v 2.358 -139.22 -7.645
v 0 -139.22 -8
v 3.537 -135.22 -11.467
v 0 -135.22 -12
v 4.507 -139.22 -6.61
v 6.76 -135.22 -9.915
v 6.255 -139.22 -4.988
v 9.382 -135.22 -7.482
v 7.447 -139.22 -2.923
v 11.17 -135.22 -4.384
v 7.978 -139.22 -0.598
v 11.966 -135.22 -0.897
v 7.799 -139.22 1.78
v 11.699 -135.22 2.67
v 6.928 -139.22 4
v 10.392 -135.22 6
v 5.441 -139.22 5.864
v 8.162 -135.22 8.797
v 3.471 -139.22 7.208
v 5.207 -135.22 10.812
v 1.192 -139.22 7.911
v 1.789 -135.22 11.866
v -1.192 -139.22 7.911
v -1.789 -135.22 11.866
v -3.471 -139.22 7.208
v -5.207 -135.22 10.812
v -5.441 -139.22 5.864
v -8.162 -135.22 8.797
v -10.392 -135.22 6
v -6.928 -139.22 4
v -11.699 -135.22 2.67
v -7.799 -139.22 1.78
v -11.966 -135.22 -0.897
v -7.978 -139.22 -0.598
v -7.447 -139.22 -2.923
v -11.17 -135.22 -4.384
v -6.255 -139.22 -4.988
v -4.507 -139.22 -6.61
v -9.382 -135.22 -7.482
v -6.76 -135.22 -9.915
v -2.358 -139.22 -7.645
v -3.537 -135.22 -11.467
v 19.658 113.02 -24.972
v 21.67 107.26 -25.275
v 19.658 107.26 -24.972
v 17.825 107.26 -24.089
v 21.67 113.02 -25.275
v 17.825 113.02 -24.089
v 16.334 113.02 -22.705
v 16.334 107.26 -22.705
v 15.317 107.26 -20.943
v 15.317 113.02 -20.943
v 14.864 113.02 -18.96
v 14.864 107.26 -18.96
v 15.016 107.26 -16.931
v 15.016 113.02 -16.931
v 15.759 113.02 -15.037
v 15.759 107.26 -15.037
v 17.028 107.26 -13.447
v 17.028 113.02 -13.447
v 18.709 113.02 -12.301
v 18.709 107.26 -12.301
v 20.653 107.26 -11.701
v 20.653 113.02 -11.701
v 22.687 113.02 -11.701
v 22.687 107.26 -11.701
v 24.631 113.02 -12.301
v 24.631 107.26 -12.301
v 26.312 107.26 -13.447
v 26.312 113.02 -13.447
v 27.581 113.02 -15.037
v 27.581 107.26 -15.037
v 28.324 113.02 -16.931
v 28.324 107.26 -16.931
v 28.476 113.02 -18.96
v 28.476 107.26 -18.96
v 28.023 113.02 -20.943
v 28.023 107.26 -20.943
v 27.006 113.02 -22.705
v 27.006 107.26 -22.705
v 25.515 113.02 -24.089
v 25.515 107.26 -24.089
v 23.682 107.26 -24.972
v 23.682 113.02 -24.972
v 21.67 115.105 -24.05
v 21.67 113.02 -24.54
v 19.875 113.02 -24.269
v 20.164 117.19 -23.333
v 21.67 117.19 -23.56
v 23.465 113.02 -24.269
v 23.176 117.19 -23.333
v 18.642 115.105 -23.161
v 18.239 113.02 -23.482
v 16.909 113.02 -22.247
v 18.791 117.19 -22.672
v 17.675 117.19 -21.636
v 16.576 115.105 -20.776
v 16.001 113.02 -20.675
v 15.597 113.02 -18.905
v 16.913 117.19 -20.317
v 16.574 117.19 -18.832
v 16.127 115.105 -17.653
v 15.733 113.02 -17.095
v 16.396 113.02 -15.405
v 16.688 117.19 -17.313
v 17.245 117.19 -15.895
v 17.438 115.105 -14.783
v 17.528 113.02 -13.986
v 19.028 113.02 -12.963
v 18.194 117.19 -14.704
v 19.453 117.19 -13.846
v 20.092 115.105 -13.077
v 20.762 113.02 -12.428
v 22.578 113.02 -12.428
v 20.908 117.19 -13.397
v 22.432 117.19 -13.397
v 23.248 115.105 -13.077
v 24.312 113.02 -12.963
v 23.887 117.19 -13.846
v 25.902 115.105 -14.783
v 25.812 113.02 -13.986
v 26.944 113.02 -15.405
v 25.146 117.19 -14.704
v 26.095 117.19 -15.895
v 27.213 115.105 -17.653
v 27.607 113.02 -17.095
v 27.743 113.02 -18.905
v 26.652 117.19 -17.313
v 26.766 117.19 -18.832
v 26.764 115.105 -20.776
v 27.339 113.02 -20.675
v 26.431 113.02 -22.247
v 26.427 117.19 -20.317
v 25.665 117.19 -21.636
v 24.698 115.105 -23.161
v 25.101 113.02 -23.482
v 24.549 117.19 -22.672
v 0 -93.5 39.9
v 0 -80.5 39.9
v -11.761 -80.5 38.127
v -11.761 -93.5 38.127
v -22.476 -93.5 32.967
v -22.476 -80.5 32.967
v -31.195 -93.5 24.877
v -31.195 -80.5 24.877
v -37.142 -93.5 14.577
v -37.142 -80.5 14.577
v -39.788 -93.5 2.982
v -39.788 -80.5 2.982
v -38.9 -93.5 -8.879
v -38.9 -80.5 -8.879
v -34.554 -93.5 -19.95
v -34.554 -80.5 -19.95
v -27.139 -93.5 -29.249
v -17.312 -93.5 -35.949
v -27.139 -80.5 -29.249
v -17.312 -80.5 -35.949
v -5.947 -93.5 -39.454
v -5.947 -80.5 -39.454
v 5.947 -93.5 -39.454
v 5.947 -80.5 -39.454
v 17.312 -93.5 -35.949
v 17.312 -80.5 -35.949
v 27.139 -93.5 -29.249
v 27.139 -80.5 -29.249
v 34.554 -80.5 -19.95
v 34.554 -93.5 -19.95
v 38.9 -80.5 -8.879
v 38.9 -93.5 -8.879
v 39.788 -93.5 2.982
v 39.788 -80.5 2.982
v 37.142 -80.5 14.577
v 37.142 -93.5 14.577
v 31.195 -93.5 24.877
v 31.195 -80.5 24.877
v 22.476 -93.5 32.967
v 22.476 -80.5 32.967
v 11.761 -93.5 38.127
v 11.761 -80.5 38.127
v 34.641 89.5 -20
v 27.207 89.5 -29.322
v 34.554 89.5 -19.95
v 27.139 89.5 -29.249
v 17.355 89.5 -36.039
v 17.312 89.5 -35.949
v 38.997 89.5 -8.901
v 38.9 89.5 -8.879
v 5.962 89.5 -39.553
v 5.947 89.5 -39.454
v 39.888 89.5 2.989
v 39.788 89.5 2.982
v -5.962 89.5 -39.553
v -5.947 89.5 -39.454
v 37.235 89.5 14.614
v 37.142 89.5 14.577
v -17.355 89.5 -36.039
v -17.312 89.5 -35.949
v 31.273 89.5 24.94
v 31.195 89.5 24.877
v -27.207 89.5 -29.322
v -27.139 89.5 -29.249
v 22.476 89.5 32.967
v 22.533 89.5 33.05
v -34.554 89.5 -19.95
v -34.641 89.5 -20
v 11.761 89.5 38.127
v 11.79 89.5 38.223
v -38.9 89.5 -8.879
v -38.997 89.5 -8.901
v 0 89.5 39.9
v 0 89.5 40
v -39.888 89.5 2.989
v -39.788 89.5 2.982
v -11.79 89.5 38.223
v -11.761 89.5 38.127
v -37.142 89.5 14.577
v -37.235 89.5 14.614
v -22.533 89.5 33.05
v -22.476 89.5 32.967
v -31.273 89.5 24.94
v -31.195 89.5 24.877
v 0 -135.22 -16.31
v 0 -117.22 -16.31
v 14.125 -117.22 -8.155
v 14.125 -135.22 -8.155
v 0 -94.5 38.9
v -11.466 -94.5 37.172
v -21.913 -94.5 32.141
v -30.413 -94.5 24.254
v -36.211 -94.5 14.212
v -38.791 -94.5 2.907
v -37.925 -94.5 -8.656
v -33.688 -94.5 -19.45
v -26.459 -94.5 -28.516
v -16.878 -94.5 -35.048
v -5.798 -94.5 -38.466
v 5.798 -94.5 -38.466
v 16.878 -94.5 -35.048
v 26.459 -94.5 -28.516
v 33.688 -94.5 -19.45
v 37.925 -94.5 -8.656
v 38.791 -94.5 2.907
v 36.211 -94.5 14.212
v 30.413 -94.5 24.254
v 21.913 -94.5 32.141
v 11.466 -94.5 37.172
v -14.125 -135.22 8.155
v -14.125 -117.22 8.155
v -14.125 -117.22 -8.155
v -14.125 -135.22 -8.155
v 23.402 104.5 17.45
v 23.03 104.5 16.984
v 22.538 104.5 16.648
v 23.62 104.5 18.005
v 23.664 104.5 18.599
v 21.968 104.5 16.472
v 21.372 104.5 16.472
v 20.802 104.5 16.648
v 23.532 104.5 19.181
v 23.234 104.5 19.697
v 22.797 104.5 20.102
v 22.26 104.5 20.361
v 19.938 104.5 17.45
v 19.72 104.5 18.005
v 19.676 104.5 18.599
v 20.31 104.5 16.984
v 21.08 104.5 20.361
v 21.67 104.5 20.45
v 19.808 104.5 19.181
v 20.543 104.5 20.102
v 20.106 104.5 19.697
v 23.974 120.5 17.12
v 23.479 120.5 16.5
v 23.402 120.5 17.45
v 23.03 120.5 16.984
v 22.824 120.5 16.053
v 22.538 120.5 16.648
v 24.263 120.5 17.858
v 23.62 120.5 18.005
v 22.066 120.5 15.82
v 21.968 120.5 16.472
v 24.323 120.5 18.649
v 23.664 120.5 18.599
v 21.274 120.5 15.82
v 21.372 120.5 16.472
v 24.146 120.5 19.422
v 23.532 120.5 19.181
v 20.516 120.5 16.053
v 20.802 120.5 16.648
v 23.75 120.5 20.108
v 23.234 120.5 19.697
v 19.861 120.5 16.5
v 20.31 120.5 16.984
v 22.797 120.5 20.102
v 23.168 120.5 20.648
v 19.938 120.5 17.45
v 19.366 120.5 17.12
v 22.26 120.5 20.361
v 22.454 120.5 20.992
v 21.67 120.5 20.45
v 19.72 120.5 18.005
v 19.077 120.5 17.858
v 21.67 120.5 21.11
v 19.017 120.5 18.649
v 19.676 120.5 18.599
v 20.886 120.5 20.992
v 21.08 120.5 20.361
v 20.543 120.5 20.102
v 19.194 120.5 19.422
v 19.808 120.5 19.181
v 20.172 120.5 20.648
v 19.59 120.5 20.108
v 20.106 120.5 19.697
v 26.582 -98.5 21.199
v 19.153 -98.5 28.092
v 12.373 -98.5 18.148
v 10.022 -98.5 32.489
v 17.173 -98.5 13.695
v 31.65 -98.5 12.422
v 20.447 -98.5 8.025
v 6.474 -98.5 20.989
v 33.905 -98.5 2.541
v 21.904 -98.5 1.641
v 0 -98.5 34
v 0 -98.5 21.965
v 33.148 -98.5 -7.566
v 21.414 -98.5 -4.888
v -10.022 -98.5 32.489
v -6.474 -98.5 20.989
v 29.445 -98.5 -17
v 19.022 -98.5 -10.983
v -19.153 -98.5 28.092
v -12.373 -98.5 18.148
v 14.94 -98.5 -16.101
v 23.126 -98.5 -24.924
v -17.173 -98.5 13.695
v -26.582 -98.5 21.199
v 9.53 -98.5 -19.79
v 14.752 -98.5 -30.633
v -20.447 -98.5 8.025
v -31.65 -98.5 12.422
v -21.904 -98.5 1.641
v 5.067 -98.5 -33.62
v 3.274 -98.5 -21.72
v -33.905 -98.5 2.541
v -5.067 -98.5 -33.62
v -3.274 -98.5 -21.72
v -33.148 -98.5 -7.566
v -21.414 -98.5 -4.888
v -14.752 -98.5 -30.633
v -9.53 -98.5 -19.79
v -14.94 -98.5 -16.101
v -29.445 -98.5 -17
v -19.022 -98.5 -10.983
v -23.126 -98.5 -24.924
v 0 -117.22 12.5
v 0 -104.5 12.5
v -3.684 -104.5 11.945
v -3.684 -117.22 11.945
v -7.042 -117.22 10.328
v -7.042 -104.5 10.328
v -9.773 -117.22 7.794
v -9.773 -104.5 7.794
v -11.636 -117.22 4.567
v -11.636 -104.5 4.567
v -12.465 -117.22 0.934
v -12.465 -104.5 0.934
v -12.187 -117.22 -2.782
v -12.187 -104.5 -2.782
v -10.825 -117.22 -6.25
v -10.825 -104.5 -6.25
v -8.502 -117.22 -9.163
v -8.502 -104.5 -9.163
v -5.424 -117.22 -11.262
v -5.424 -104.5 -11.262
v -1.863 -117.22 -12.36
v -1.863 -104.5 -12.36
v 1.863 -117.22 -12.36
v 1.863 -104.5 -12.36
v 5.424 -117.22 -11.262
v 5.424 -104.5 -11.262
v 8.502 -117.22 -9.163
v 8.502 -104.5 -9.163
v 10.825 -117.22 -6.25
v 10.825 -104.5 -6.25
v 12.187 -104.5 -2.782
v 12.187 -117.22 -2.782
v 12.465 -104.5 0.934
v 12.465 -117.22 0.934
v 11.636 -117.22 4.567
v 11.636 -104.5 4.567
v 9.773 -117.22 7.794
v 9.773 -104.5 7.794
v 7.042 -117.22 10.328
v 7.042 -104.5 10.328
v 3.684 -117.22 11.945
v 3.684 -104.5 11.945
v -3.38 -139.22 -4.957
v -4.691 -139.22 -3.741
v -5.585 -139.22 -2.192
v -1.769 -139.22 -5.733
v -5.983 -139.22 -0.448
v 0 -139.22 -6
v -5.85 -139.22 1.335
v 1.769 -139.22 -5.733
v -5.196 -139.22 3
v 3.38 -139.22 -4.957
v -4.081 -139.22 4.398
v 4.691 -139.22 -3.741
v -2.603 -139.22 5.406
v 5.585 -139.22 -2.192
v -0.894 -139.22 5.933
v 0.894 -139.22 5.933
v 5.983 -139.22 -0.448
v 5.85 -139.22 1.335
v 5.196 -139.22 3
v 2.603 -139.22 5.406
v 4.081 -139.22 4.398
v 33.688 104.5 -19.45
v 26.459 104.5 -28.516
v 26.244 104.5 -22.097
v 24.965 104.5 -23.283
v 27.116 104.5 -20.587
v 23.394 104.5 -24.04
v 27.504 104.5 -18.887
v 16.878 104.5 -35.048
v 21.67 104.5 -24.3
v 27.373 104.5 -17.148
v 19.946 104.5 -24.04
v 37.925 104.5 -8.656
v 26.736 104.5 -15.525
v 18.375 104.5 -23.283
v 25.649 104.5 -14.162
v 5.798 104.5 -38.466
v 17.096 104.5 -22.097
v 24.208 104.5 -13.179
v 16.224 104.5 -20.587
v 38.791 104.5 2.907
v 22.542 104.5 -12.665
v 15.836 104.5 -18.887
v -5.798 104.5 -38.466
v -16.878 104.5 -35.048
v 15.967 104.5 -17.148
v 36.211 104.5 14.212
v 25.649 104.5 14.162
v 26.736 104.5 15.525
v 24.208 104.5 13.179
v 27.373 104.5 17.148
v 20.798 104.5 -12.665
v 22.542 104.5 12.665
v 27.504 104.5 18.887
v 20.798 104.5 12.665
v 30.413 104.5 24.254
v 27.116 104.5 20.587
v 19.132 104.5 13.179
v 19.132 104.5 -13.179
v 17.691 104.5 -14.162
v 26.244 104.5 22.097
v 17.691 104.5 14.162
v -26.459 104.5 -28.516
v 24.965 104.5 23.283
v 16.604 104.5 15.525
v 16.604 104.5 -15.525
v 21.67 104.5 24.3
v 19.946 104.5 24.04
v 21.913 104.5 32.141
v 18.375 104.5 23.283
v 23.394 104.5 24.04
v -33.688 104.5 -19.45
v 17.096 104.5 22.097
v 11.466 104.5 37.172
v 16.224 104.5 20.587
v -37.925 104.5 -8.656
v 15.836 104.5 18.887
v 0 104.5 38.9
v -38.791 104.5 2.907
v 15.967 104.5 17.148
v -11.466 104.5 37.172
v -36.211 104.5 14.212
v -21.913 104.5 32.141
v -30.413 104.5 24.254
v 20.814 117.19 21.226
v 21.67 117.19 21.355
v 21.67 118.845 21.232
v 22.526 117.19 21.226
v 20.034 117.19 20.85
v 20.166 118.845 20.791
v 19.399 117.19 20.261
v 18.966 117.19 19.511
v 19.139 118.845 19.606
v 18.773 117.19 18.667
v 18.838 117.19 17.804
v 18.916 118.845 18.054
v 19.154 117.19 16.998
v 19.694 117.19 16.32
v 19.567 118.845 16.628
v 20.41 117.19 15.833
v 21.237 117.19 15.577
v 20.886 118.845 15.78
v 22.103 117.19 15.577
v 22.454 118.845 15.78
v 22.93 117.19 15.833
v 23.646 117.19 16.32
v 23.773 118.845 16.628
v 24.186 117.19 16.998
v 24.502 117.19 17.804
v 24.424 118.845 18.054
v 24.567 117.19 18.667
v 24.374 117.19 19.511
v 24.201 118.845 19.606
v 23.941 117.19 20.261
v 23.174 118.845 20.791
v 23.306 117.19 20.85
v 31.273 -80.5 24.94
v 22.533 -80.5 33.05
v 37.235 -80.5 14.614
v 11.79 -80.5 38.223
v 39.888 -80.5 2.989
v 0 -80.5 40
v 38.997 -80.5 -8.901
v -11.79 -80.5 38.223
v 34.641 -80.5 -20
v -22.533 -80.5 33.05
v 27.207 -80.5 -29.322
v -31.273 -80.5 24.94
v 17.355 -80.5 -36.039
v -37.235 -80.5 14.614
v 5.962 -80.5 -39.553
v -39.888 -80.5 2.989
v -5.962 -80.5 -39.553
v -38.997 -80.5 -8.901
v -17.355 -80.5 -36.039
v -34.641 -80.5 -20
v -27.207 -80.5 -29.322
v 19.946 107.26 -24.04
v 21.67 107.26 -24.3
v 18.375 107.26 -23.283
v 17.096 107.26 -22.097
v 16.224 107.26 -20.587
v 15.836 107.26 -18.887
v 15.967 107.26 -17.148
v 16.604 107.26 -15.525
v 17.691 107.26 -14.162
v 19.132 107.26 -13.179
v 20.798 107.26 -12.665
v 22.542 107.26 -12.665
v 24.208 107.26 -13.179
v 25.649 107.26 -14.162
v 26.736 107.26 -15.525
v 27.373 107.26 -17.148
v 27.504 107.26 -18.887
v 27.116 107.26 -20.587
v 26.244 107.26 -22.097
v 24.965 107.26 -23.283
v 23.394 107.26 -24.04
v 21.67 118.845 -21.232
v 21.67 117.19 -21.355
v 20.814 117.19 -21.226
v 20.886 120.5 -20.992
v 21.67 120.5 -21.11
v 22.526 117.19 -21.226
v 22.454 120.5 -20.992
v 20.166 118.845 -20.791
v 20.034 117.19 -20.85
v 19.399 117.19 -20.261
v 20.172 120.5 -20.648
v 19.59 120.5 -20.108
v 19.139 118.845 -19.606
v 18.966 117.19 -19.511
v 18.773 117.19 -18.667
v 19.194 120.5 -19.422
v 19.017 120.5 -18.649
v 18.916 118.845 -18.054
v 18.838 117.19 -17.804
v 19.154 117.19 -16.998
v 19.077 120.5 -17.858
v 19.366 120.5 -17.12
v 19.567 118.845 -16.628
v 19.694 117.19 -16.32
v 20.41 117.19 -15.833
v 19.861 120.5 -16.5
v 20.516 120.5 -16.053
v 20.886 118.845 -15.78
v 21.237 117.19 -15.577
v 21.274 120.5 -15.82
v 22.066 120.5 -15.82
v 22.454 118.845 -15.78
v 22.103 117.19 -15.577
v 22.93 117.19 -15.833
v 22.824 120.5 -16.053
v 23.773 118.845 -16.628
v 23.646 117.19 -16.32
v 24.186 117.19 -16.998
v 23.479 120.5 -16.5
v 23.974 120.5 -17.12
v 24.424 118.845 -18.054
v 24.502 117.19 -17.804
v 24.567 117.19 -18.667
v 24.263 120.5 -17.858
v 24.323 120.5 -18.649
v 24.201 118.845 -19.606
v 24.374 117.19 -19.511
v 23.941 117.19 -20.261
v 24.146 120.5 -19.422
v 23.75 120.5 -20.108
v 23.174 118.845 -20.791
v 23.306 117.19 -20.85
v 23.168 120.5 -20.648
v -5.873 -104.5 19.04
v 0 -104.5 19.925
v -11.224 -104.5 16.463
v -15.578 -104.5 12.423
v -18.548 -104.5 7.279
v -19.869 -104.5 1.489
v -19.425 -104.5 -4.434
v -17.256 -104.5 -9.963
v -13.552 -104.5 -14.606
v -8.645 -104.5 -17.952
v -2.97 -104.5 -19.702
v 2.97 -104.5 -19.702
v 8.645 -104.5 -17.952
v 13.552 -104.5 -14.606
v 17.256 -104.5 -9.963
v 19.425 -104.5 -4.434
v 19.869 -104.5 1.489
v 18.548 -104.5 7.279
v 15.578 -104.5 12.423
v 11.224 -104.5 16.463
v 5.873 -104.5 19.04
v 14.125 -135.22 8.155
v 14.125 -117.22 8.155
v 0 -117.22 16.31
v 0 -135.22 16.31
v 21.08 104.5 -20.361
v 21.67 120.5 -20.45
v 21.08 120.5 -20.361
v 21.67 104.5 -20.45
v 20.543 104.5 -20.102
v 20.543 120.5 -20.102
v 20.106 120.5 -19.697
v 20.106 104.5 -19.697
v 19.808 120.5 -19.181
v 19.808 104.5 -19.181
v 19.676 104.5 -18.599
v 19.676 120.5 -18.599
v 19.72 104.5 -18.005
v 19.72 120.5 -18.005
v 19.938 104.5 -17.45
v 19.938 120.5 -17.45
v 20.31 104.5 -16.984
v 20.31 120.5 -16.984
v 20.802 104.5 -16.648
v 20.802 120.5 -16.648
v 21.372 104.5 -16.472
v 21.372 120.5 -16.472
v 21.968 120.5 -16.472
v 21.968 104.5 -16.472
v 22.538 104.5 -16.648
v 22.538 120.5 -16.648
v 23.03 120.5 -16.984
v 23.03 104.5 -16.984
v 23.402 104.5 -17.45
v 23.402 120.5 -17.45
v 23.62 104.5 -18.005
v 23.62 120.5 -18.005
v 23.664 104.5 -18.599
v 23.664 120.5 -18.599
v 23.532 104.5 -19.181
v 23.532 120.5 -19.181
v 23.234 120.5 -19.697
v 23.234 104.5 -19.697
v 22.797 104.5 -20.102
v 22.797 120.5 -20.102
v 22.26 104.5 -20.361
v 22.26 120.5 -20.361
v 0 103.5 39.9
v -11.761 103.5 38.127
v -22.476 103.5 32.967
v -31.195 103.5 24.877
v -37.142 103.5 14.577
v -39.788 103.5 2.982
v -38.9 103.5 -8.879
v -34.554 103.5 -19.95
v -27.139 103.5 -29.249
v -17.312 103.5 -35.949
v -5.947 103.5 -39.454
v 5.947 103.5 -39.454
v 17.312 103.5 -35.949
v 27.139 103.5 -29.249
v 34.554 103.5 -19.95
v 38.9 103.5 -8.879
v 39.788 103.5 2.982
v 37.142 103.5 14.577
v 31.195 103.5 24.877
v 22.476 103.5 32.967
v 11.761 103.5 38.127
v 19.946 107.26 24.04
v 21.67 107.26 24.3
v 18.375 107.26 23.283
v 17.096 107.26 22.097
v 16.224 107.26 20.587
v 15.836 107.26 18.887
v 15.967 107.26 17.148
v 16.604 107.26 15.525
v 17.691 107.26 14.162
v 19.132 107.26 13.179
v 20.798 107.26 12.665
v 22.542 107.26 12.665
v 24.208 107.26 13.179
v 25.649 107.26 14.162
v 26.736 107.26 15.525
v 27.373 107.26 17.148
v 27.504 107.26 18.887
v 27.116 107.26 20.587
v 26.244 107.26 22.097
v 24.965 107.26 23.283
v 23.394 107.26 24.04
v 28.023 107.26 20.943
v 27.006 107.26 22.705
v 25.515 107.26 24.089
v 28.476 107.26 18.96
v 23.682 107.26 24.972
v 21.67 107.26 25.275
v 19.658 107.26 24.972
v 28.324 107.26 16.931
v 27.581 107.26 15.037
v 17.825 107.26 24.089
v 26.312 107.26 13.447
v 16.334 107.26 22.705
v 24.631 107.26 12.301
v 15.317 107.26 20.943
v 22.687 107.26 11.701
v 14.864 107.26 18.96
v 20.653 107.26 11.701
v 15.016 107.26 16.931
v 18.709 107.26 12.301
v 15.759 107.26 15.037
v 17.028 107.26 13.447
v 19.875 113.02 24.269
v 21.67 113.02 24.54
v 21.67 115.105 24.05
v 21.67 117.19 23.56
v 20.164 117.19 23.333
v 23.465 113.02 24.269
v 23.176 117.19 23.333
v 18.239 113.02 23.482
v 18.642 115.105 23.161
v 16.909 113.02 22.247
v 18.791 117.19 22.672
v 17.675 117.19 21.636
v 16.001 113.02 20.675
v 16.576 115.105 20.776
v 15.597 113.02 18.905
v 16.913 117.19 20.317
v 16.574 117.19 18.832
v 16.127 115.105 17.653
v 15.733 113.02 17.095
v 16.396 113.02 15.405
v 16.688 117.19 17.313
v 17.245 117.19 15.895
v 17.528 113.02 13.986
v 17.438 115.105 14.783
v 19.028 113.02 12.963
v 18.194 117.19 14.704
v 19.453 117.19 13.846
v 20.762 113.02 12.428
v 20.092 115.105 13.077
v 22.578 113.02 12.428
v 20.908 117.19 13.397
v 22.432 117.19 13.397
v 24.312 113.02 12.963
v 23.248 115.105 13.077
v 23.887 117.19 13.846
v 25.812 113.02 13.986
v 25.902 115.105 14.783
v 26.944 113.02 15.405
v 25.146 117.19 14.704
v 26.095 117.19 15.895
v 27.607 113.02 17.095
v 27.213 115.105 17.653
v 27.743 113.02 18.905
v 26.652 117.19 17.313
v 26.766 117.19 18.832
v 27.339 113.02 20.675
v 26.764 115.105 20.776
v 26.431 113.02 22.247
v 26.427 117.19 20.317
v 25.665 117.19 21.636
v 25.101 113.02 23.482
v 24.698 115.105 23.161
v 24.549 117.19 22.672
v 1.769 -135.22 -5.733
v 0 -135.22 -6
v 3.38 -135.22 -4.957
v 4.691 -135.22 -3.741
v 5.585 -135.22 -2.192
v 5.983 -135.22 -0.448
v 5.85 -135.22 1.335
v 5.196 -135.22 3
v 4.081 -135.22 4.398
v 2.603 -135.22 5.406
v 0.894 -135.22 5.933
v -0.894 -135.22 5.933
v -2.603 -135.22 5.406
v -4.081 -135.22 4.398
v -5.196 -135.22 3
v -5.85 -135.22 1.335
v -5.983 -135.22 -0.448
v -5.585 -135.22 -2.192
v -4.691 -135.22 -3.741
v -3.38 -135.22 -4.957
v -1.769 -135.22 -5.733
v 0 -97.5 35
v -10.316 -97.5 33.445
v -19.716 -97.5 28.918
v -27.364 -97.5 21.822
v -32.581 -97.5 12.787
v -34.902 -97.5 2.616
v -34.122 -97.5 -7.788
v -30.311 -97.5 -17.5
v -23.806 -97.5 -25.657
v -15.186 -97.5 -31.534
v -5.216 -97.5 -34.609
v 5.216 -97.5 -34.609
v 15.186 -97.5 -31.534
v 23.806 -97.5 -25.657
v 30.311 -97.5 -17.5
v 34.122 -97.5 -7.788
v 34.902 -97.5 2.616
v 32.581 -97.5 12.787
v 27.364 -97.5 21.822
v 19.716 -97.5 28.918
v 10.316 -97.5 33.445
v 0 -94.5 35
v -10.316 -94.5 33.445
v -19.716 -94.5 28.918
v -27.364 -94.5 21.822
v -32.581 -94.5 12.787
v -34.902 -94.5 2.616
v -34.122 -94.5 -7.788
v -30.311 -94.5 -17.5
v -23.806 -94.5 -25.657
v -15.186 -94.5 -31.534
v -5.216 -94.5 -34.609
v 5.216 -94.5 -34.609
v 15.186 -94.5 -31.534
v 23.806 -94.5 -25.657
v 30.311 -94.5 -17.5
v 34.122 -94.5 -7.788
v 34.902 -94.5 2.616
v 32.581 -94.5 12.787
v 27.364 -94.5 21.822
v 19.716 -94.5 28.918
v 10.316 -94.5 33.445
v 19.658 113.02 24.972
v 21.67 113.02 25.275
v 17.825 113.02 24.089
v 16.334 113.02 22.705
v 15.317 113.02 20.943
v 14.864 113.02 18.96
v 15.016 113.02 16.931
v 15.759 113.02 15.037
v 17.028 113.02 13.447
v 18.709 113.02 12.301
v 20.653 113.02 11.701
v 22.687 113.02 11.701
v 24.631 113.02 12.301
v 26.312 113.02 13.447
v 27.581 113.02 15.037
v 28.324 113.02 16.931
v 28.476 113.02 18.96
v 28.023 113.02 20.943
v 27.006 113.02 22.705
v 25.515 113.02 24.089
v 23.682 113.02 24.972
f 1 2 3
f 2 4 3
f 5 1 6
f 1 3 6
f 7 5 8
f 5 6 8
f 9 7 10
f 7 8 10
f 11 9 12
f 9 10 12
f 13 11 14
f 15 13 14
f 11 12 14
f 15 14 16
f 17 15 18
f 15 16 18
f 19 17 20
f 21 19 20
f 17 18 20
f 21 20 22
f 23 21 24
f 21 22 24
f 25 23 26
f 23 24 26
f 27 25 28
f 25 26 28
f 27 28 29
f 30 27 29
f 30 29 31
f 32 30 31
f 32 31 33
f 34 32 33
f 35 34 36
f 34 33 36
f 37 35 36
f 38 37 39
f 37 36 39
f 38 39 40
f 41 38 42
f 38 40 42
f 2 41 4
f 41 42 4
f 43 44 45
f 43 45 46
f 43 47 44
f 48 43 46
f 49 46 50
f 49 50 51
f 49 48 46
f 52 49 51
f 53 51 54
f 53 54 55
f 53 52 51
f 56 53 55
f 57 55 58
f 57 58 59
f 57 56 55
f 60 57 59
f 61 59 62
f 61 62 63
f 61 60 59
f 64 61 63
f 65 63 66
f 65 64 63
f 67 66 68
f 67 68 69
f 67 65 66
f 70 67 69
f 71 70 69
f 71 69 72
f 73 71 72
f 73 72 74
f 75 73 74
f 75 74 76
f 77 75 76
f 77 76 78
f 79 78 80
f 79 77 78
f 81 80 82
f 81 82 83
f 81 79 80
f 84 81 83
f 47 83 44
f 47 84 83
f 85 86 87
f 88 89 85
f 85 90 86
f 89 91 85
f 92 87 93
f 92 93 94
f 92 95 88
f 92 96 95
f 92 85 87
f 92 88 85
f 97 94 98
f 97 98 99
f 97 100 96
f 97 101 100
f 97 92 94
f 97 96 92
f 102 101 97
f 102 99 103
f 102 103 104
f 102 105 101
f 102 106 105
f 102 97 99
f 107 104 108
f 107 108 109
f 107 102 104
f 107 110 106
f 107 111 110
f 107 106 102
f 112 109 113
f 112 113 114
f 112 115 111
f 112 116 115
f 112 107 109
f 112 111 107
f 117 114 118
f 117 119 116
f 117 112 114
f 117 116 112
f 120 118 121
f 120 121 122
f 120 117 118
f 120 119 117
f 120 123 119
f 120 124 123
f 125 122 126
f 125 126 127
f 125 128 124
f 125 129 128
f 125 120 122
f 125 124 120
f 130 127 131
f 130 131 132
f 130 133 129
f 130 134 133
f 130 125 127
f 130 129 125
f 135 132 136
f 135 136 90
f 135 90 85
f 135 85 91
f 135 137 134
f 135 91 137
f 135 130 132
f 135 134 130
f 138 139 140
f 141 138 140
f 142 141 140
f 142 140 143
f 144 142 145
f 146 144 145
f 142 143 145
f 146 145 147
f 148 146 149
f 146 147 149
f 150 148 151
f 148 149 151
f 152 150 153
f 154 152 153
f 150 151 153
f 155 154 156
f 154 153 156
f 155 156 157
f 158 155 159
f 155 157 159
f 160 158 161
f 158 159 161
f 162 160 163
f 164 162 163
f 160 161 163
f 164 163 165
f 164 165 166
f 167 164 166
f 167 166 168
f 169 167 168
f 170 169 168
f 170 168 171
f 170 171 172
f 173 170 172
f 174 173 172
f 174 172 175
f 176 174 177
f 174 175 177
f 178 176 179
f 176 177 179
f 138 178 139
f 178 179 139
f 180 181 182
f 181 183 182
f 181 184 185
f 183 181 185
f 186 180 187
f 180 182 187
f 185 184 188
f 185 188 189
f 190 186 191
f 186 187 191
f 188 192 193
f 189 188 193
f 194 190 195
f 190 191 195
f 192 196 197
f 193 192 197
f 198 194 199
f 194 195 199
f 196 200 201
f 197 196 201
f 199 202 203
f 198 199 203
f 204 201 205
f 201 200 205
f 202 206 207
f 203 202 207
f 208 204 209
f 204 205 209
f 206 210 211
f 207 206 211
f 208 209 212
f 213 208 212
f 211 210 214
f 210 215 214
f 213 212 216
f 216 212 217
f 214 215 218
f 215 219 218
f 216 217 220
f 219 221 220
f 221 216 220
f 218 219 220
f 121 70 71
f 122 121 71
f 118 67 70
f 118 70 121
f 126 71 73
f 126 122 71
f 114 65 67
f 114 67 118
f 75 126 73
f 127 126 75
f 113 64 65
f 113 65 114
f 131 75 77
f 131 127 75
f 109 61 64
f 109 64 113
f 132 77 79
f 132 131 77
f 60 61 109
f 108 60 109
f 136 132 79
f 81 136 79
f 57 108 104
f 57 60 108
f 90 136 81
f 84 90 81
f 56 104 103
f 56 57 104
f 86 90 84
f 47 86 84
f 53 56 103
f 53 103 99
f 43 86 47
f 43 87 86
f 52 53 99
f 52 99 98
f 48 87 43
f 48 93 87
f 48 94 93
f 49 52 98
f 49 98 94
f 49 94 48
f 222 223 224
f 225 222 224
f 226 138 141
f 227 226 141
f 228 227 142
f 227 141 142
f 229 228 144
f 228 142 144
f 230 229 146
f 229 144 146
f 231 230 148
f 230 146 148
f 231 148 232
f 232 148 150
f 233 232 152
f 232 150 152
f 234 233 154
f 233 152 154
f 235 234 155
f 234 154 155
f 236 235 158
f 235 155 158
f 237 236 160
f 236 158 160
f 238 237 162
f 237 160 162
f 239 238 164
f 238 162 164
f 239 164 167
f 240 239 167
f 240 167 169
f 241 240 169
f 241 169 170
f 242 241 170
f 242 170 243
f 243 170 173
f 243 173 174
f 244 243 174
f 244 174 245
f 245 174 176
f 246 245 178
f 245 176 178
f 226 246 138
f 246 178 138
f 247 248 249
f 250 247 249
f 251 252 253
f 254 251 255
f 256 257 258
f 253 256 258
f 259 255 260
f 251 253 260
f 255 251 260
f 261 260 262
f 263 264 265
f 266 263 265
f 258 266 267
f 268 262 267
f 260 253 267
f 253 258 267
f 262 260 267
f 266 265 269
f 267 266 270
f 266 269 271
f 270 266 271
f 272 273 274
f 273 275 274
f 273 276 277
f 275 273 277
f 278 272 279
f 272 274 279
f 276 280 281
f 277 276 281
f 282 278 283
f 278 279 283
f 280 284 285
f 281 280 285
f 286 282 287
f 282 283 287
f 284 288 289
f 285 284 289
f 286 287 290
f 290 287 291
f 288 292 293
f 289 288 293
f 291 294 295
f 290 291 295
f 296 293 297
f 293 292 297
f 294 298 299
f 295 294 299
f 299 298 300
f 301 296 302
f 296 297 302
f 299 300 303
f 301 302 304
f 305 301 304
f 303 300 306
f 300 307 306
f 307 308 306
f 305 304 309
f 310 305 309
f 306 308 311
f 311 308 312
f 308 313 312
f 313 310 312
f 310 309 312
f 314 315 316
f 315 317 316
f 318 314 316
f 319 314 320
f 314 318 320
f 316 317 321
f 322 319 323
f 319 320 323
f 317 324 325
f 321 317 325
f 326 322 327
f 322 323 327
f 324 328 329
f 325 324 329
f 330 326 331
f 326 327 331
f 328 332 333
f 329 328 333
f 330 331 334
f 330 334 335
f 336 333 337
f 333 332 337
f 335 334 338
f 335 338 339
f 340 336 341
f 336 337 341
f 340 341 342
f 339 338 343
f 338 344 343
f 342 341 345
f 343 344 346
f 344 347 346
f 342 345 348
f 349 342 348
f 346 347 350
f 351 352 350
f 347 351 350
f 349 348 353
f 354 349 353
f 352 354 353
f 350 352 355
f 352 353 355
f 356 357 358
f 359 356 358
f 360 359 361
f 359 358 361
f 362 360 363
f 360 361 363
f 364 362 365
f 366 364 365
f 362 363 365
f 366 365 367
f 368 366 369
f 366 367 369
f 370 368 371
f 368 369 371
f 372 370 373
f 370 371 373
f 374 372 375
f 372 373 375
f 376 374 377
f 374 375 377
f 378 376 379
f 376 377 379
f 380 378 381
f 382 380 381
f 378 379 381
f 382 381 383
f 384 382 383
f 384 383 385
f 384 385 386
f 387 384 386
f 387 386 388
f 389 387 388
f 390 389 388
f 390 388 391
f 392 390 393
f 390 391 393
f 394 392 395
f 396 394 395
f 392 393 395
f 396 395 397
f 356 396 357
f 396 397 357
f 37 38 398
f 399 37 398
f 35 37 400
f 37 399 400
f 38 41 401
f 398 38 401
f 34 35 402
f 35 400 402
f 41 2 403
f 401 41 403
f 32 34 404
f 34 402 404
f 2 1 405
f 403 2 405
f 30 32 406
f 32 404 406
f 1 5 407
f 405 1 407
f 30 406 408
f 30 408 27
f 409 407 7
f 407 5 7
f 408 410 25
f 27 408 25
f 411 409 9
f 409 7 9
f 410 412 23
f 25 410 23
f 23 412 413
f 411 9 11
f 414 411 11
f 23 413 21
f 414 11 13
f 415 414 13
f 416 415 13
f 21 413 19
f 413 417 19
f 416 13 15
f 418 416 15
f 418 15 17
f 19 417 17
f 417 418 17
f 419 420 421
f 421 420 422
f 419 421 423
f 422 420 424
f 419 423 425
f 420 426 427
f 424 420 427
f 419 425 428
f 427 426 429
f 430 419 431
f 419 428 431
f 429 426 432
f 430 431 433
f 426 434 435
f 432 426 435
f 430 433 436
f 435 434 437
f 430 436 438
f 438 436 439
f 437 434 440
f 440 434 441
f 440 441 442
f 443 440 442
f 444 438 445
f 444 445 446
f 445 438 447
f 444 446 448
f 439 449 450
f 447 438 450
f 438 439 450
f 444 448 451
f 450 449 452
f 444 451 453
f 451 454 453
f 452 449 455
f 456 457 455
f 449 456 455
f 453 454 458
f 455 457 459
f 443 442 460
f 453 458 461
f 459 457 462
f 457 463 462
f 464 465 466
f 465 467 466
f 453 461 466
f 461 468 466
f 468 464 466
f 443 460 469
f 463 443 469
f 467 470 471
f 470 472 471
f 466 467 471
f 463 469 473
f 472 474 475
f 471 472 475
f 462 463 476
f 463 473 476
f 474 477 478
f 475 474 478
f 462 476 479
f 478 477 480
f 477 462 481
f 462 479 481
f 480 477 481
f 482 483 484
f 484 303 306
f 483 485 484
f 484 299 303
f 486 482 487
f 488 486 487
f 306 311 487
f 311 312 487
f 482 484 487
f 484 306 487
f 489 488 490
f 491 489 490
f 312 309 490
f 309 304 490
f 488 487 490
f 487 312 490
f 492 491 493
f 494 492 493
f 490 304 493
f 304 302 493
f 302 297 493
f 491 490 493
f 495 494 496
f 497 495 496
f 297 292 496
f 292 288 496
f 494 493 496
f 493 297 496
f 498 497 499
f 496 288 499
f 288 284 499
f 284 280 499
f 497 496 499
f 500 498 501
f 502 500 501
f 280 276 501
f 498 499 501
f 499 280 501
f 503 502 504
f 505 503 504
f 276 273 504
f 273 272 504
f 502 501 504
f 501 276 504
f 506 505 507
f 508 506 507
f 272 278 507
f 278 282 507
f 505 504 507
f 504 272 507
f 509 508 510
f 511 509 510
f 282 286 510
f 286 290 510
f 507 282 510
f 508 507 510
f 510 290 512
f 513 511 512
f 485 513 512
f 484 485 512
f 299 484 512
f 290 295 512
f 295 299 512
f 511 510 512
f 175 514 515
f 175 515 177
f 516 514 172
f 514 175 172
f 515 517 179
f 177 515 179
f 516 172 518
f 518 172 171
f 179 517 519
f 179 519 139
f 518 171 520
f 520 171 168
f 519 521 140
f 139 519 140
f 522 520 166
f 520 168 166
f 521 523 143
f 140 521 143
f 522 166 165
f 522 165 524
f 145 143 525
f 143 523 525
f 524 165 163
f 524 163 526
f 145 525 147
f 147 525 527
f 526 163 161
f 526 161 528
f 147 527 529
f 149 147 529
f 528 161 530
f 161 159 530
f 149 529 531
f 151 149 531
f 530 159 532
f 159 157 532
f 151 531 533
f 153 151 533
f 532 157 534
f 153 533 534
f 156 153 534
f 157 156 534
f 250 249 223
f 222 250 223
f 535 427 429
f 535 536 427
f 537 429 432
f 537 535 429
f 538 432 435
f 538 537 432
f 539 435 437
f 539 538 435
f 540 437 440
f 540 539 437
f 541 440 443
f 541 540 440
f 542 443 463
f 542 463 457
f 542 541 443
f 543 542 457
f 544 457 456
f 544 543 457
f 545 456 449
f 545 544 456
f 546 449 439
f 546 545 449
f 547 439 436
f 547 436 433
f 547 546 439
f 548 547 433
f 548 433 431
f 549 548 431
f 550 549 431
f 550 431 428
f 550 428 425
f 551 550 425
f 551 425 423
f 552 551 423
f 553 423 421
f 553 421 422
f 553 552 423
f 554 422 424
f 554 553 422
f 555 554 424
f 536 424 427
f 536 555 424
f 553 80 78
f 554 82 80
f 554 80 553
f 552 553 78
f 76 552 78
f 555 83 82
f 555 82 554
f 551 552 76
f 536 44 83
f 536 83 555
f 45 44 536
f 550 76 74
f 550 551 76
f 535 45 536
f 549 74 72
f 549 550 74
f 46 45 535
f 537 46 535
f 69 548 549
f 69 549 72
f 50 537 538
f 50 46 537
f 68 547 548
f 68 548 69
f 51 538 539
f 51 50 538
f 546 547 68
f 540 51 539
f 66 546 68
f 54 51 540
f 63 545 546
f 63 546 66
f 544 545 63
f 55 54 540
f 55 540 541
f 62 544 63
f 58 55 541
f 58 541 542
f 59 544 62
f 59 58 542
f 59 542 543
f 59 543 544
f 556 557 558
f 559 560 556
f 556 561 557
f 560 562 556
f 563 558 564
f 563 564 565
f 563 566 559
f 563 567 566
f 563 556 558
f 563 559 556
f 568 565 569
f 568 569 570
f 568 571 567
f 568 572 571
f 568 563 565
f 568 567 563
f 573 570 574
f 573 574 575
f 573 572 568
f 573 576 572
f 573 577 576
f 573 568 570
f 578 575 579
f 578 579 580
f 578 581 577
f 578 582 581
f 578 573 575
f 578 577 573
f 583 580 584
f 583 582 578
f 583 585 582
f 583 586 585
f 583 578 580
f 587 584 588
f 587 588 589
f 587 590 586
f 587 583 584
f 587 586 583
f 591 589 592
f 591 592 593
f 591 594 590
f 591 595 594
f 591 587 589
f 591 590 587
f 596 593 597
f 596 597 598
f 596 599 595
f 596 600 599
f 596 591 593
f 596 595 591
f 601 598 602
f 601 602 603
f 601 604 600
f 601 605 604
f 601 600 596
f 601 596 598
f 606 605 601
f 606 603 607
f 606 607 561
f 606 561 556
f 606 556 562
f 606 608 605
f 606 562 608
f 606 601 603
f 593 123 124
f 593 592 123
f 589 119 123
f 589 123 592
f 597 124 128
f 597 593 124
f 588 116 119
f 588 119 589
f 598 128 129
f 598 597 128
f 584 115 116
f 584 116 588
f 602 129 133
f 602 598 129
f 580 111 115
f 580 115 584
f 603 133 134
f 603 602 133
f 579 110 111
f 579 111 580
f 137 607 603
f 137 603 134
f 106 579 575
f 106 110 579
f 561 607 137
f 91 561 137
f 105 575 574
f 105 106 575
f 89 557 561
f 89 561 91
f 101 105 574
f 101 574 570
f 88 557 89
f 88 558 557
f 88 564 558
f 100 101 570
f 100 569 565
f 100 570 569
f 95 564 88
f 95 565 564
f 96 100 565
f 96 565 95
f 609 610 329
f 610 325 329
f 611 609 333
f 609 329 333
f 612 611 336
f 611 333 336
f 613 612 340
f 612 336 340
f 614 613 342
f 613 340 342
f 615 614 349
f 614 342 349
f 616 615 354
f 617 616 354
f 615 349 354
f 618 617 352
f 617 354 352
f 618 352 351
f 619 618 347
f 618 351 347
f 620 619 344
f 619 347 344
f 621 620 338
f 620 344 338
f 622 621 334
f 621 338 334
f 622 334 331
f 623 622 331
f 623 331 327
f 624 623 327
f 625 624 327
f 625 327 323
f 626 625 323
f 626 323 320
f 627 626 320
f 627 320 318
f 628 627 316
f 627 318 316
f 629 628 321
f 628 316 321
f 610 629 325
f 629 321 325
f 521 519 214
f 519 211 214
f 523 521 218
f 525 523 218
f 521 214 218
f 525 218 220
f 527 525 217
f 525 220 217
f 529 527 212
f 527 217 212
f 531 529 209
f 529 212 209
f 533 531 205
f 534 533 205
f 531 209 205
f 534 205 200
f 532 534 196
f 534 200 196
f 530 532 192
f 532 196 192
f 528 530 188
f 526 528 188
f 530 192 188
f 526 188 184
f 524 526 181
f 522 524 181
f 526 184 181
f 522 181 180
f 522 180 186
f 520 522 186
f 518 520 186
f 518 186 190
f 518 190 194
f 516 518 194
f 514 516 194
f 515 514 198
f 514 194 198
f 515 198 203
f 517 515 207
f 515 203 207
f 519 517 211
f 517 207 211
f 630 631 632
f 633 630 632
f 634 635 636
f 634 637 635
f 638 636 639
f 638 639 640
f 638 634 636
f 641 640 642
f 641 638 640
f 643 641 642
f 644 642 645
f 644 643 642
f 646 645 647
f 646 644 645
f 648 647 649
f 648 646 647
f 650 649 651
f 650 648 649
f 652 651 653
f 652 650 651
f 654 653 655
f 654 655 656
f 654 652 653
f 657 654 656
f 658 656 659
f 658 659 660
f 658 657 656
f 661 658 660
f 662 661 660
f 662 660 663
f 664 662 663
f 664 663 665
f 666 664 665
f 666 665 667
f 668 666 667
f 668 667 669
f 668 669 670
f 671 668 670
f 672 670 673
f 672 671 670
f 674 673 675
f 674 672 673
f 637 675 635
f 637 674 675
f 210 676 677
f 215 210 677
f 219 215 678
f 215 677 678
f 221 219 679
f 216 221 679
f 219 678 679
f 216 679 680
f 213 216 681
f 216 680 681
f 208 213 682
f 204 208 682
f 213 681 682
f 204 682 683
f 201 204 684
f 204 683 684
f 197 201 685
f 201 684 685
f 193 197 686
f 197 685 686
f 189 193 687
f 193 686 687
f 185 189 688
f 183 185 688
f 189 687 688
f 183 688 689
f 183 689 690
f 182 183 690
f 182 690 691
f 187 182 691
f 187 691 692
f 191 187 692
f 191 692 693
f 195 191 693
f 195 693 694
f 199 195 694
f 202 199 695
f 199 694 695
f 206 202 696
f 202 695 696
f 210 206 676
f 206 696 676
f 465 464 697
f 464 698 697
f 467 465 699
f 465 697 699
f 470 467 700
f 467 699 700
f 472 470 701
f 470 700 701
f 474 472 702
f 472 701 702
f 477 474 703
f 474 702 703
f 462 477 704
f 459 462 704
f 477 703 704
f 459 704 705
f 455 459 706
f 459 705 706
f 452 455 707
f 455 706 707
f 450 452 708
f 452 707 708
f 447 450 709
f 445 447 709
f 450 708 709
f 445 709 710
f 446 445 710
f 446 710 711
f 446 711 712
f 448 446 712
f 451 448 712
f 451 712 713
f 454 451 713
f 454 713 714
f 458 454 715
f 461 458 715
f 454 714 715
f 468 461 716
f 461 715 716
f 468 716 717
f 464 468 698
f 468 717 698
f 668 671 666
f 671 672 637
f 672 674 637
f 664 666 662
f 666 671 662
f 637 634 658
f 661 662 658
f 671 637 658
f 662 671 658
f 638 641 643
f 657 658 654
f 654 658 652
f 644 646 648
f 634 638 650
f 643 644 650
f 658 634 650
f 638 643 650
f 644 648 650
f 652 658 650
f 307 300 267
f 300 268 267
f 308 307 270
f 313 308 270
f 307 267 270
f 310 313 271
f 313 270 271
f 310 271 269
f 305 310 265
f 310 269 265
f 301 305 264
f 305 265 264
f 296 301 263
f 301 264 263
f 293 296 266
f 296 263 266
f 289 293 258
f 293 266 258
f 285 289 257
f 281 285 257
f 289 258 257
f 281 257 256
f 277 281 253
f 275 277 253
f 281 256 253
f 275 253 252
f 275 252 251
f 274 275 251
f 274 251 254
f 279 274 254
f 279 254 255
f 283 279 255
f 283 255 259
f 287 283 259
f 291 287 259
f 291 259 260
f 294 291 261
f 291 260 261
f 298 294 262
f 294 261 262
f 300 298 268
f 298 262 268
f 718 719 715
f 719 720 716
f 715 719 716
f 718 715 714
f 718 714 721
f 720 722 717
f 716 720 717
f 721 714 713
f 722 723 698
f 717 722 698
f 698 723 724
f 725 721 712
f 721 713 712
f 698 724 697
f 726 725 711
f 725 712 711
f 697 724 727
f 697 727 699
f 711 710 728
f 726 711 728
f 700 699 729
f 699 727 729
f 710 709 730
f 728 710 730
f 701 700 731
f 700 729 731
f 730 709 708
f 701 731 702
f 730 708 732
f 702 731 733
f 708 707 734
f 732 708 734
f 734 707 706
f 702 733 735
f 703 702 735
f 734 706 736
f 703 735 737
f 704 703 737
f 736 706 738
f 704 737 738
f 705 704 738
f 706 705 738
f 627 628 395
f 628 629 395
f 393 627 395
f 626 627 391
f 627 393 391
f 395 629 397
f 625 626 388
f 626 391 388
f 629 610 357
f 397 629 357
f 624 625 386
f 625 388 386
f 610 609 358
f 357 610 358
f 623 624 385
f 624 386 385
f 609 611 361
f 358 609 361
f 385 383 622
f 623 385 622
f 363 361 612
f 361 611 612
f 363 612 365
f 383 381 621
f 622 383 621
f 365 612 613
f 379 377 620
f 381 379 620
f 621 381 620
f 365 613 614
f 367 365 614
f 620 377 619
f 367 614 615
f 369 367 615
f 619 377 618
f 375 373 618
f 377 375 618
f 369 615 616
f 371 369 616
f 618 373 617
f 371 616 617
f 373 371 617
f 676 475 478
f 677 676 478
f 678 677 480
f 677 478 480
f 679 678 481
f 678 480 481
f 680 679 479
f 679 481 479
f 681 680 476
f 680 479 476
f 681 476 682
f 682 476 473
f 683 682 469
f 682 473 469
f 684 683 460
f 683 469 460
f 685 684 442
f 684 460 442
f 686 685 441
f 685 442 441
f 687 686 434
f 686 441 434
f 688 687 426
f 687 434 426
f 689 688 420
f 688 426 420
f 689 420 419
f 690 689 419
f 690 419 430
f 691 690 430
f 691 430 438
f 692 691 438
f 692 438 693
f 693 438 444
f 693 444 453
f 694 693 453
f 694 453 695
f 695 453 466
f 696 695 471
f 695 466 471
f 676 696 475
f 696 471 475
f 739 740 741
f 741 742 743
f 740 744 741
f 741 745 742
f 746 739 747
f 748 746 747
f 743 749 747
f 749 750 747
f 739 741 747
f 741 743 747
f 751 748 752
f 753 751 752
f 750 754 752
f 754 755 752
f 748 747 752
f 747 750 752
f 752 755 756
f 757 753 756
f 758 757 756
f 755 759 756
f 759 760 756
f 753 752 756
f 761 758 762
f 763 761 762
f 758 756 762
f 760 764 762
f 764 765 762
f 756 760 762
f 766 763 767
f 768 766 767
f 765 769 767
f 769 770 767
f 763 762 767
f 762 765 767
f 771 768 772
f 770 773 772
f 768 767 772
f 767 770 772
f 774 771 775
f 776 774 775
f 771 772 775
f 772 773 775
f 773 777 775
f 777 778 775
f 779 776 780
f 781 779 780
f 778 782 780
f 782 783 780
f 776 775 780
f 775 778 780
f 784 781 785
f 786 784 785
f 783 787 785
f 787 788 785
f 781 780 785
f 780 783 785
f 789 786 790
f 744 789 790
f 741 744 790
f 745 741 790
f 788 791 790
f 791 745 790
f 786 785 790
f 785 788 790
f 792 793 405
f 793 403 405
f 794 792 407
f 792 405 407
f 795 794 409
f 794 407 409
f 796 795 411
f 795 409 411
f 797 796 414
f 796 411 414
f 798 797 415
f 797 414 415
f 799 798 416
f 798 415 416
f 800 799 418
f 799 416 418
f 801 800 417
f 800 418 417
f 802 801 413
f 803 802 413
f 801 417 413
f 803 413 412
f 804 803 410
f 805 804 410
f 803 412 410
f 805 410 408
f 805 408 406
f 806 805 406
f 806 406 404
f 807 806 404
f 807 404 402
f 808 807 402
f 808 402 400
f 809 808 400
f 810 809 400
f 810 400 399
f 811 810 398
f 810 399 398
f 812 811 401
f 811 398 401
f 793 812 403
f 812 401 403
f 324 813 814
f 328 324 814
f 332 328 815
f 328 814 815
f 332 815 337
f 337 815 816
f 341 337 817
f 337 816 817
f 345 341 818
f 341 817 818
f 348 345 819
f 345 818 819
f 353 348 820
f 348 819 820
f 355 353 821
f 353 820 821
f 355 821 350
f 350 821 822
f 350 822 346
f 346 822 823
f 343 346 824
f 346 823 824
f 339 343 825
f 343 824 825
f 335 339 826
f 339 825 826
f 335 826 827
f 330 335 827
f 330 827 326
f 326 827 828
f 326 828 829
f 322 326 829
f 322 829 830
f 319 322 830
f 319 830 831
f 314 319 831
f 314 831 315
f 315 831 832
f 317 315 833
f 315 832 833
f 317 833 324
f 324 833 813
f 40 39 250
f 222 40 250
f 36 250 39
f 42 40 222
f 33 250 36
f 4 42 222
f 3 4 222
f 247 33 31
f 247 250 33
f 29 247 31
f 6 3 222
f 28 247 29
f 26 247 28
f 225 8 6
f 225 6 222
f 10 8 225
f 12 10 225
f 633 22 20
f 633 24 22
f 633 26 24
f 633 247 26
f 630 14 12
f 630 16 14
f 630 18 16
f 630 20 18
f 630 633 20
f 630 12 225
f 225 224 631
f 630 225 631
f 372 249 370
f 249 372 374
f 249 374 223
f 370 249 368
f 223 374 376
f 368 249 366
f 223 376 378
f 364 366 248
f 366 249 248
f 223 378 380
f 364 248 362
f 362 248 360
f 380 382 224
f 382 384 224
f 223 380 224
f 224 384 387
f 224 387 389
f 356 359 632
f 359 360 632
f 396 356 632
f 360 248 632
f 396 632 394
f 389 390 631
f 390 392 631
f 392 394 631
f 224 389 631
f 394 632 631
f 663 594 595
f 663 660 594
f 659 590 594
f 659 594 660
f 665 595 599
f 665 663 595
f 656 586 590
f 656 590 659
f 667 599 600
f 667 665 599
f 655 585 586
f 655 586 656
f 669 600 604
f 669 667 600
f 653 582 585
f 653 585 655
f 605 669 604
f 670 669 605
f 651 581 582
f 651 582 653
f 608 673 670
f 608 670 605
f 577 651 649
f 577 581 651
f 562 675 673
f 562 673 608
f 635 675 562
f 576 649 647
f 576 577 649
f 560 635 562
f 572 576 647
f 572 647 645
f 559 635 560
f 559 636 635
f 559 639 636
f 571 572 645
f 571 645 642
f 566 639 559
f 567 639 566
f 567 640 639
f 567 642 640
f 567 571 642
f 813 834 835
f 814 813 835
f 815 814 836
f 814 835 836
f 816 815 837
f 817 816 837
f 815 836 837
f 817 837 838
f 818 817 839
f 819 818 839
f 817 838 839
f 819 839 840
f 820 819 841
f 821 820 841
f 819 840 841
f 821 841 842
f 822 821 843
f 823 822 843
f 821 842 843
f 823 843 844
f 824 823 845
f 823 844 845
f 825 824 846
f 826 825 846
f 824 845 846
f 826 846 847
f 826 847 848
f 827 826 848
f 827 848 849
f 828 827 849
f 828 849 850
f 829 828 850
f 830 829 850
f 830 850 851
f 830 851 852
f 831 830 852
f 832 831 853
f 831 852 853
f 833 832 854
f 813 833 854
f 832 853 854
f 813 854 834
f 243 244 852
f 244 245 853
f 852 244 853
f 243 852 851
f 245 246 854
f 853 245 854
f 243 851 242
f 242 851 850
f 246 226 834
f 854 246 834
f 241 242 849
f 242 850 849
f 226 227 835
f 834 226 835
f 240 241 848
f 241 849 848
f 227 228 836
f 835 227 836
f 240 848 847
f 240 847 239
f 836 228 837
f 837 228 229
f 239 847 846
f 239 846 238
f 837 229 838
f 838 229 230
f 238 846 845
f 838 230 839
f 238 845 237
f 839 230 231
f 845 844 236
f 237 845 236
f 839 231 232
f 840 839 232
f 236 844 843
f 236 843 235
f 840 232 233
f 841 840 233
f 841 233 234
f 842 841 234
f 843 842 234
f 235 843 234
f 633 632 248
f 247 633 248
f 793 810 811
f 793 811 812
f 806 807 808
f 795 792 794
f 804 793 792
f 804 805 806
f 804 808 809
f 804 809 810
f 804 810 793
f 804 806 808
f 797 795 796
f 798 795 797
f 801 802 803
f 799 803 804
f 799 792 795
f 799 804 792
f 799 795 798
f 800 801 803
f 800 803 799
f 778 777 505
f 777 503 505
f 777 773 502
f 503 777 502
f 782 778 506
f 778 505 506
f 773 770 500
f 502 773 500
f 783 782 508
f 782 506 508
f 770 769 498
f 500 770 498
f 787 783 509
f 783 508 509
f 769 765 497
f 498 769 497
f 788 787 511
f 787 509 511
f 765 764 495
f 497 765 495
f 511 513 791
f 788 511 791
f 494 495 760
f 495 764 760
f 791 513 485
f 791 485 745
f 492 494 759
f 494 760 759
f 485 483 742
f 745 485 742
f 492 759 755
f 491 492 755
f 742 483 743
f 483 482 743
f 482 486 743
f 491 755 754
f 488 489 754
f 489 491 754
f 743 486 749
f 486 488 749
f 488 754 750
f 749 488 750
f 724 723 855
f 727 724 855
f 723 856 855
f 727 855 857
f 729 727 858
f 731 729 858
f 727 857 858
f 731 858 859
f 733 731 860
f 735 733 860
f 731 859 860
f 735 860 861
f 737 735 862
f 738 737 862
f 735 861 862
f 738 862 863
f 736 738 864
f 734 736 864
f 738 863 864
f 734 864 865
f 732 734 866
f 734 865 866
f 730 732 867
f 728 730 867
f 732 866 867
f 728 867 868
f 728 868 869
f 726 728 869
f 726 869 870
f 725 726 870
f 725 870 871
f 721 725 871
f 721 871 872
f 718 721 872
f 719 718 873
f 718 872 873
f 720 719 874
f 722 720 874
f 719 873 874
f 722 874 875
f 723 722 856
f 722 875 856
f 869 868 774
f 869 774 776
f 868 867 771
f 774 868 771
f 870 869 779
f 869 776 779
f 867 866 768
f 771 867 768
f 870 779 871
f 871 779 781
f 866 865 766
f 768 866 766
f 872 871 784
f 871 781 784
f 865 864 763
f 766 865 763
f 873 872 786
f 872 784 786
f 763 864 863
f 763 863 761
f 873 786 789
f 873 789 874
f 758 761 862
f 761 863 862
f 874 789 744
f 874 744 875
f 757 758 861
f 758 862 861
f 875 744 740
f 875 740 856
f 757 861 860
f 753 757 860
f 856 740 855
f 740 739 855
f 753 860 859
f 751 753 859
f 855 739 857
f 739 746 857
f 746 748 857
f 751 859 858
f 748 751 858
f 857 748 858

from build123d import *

# Parameters (mm, degrees)
SKETCH2_R           = 12.5
BOSS_EXTRUDE1_DEPTH = 12.72
CHAMFER1_SIZE       = 1
BOSS_EXTRUDE2_DEPTH = 18


with BuildPart() as part:
    # Sketch1 → Revolve1 (revolve)
    with BuildSketch(Plane(origin=(0, 0, 0), x_dir=(0, 0, -1), z_dir=(1, 0, 0))):
        Polygon((0, 104.5), (0, -104.5), (-19.925, -104.5), (-21.965, -98.5), (-35, -98.5), (-35, -94.5), (-39.9, -94.5), (-39.9, -80.5), (-40, -80.5), (-40, 89.5), (-39.9, 89.5), (-39.9, 104.5), align=None)
    revolve(axis=Axis((0, 104.5, 0), (0, -1, 0)))

    # Sketch2 → Boss-Extrude1 (add)
    with BuildSketch(Plane.XZ.offset(104.5)):
        with Locations(Location((0, 0, 0), (0, 0, 90))):
            Circle(SKETCH2_R)
    extrude(amount=BOSS_EXTRUDE1_DEPTH)

    # Chamfer1
    chamfer1_edges = [part.edges().sort_by_distance(p)[0] for p in [
        (0, -98.5, -35),
        (0, -94.5, -39.9),
        (0, 104.5, -39.9),
    ]]
    chamfer(chamfer1_edges, length=CHAMFER1_SIZE)

    # Sketch3 → Boss-Extrude2 (add)
    with BuildSketch(Plane.XZ.offset(117.22)):
        Polygon((0, 16.310145105), (-14.125, 8.155072552), (-14.125, -8.155072552), (0, -16.310145105), (14.125, -8.155072552), (14.125, 8.155072552), align=None)
    extrude(amount=BOSS_EXTRUDE2_DEPTH)

    # Sketch4 → Revolve2 (revolve)
    with BuildSketch(Plane(origin=(0, 0, 0), x_dir=(0, 0, -1), z_dir=(1, 0, 0)), mode=Mode.PRIVATE) as revolve2_sk:
        Polygon((-6, -135.22), (-6, -139.22), (-8, -139.22), (-12, -135.22), align=None)
    revolve(revolve2_sk.sketch.rotate(Axis((0, 258.155027854, 0), (0, -1, 0)), 180), axis=Axis((0, 258.155027854, 0), (0, -1, 0)))

    # Sketch6 → Revolve3 (revolve)
    with BuildSketch(Plane(origin=(21.67, 0, 0), x_dir=(0, 0, -1), z_dir=(1, 0, 0))):
        Polygon((20.45, 104.5), (24.3, 104.5), (24.3, 107.26), (25.275, 107.26), (25.275, 113.02), (24.54, 113.02), (23.56, 117.19), (21.355, 117.19), (21.11, 120.5), (20.45, 120.5), align=None)
    revolve3 = revolve(axis=Axis((21.67, 104.5, -18.45), (0, 1, 0)))

    # Mirror1: Revolve3 across plane
    add(revolve3.mirror(Plane.XY))


solid = part.part
